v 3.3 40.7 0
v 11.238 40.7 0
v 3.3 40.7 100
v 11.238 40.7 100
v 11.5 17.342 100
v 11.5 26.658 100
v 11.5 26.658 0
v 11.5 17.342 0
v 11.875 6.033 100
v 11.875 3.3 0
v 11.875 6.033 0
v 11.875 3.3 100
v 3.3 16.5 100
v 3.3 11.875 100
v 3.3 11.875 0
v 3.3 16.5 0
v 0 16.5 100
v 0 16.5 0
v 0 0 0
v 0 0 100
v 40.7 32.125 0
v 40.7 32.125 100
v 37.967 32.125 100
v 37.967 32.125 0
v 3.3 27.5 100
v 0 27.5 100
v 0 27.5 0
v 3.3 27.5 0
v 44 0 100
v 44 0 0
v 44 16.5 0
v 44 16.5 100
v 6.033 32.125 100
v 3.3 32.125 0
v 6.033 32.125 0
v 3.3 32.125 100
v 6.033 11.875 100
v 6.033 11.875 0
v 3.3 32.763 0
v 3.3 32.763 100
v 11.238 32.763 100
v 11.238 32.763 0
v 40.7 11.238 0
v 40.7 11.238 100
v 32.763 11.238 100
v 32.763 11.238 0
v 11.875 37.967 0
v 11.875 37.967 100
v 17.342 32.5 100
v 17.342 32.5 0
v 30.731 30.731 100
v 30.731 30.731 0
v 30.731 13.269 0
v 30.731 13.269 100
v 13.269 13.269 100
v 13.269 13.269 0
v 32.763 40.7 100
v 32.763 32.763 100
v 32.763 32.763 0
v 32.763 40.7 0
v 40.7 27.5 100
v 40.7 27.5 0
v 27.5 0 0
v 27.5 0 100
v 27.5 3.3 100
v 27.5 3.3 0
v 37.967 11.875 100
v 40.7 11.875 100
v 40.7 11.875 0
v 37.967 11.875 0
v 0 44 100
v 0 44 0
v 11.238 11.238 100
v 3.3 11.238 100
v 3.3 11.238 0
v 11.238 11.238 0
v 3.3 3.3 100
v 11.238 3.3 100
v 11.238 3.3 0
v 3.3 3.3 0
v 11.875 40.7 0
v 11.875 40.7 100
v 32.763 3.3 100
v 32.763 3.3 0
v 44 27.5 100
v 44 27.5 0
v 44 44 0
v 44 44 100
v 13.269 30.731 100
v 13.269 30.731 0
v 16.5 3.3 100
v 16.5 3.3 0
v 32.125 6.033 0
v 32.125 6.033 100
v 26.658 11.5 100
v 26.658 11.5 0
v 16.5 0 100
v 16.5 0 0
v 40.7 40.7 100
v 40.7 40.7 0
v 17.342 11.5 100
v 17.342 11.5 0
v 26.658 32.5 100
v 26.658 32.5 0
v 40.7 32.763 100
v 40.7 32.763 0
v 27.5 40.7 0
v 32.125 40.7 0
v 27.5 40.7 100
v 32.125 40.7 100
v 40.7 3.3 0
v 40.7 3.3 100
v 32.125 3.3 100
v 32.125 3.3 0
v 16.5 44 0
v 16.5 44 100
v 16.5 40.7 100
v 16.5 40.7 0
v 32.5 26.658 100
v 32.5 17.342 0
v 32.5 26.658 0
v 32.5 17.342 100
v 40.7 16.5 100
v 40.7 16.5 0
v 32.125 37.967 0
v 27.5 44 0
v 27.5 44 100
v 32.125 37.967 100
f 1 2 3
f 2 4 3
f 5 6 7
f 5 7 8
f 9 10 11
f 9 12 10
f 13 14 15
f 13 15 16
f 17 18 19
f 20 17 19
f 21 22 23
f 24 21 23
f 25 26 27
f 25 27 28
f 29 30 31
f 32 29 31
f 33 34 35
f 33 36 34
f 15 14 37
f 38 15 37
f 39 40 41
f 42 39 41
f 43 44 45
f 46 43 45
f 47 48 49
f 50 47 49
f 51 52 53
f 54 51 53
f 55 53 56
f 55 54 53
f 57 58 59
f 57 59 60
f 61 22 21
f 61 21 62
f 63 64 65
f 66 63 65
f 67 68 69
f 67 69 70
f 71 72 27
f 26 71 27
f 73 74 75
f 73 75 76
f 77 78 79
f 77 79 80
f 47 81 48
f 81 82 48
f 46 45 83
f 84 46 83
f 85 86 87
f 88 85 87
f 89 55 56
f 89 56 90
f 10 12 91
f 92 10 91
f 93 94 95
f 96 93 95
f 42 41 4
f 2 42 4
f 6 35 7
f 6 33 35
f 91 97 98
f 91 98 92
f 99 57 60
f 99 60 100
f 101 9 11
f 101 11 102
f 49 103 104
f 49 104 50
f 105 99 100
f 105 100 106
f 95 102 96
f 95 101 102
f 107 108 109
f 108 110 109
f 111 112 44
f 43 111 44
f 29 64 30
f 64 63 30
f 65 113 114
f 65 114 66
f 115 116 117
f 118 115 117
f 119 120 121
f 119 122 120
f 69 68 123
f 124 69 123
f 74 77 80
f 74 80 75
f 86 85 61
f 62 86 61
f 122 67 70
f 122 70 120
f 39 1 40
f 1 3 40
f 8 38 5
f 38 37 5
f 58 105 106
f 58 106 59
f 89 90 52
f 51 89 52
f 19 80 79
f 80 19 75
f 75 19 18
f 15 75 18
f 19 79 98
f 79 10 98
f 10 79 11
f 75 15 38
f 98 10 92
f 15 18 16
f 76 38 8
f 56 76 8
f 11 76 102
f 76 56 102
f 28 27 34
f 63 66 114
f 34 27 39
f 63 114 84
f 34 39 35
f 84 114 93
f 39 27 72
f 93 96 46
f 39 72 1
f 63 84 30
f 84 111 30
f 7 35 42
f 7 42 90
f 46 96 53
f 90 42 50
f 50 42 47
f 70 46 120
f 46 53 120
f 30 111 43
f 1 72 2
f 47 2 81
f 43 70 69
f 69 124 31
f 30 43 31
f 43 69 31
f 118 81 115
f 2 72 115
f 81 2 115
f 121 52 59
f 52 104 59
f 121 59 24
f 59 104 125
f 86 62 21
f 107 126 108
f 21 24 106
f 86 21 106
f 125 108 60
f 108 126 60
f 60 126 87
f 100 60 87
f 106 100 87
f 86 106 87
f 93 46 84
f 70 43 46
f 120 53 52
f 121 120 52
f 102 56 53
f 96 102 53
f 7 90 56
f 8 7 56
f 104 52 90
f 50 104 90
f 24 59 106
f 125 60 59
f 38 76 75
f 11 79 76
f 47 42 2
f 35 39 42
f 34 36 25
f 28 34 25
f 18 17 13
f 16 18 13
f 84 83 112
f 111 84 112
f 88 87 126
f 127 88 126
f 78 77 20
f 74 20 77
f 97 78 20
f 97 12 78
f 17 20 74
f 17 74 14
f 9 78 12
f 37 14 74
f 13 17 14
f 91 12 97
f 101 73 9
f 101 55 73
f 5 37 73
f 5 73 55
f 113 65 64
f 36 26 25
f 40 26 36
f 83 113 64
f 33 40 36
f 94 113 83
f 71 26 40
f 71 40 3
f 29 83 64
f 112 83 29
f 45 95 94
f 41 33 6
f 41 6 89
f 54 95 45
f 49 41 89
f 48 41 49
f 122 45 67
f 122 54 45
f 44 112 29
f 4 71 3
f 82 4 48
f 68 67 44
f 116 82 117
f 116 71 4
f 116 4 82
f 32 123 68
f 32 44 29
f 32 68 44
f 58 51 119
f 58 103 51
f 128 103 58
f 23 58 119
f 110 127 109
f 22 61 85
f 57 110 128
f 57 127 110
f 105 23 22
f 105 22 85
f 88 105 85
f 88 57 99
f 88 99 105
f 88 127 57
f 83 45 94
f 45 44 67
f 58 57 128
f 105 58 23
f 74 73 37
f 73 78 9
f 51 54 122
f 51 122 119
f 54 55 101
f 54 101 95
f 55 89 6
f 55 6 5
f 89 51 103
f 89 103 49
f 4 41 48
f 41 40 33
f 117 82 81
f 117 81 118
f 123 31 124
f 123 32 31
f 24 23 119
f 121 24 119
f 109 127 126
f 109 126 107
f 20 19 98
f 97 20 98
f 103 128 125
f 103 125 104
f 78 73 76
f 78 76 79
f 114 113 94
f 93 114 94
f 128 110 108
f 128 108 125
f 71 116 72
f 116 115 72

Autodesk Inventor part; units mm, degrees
ref_plane "YZ Plane" through (0, 0, 0) normal (1, 0, 0) x (0, 1, 0)
ref_plane "XZ Plane" through (0, 0, 0) normal (0, 1, 0) x (-1, 0, 0)
ref_plane "XY Plane" through (0, 0, 0) normal (0, 0, 1) x (1, 0, 0)
sketch "Sketch1" plane through (0, 0, 0) normal (0, 0, 1) x (1, 0, 0)
  line L0 (0, 0) -> (44, 0)
  line L1 (44, 0) -> (44, 44)
  line L2 (44, 44) -> (0, 44)
  line L3 (0, 44) -> (0, 0)
  dimension "d5" = 44
  dimension "d6" = 44
extrude "JOKAB, 44MM" add sketch "Sketch1" along normal blind 100
sketch "Sketch2" plane through (0, 0, 100) normal (0, 0, 1) x (1, 0, 0)
  line L0 (44, 0) -> (0, 0) projected
  line L1 (0, 44) -> (44, 44) projected
  line L2 (44, 44) -> (0, 44) projected
  line L3 (16.5, 44) -> (16.5, 40.7)
  line L4 (11.875, 40.7) -> (11.875, 37.9667)
  line L5 (11.875, 37.9667) -> (17.3417, 32.5)
  line L6 (22, 44) -> (22, 0) construction
  line L7 (0, 44) -> (0, 0) projected
  line L8 (0, 22) -> (44, 22) construction
  line L9 (44, 0) -> (44, 44) projected
  line L10 (17.3417, 32.5) -> (22, 32.5)
  line L11 (11.875, 40.7) -> (16.5, 40.7)
  line L12 (27.5, 44) -> (27.5, 40.7)
  line L13 (32.125, 40.7) -> (32.125, 37.9667)
  line L14 (32.125, 37.9667) -> (26.6583, 32.5)
  line L15 (26.6583, 32.5) -> (22, 32.5)
  line L16 (32.125, 40.7) -> (27.5, 40.7)
  line L17 (16.5, 0) -> (16.5, 3.3)
  line L18 (11.875, 3.3) -> (11.875, 6.0333)
  line L19 (11.875, 6.0333) -> (17.3417, 11.5)
  line L20 (17.3417, 11.5) -> (22, 11.5)
  line L21 (11.875, 3.3) -> (16.5, 3.3)
  line L22 (27.5, 0) -> (27.5, 3.3)
  line L23 (32.125, 3.3) -> (27.5, 3.3)
  line L24 (32.125, 3.3) -> (32.125, 6.0333)
  line L25 (32.125, 6.0333) -> (26.6583, 11.5)
  line L26 (26.6583, 11.5) -> (22, 11.5)
  line L27 (0, 16.5) -> (3.3, 16.5)
  line L28 (3.3, 11.875) -> (6.0333, 11.875)
  line L29 (6.0333, 11.875) -> (11.5, 17.3417)
  line L30 (22, 0) -> (22, 44) construction
  line L31 (11.5, 17.3417) -> (11.5, 22)
  line L32 (3.3, 11.875) -> (3.3, 16.5)
  line L33 (0, 27.5) -> (3.3, 27.5)
  line L34 (3.3, 32.125) -> (3.3, 27.5)
  line L35 (3.3, 32.125) -> (6.0333, 32.125)
  line L36 (6.0333, 32.125) -> (11.5, 26.6583)
  line L37 (11.5, 26.6583) -> (11.5, 22)
  line L38 (27.5, 0) -> (27.5, 3.3)
  line L39 (32.125, 3.3) -> (32.125, 6.0333)
  line L40 (32.125, 6.0333) -> (26.6583, 11.5)
  line L41 (44, 22) -> (0, 22) construction
  line L42 (26.6583, 11.5) -> (22, 11.5)
  line L43 (32.125, 3.3) -> (27.5, 3.3)
  line L44 (16.5, 0) -> (16.5, 3.3)
  line L45 (11.875, 3.3) -> (16.5, 3.3)
  line L46 (11.875, 3.3) -> (11.875, 6.0333)
  line L47 (11.875, 6.0333) -> (17.3417, 11.5)
  line L48 (17.3417, 11.5) -> (22, 11.5)
  line L49 (44, 27.5) -> (40.7, 27.5)
  line L50 (40.7, 32.125) -> (37.9667, 32.125)
  line L51 (37.9667, 32.125) -> (32.5, 26.6583)
  line L52 (22, 44) -> (22, 0) construction
  line L53 (32.5, 26.6583) -> (32.5, 22)
  line L54 (40.7, 32.125) -> (40.7, 27.5)
  line L55 (44, 16.5) -> (40.7, 16.5)
  line L56 (40.7, 11.875) -> (40.7, 16.5)
  line L57 (40.7, 11.875) -> (37.9667, 11.875)
  line L58 (37.9667, 11.875) -> (32.5, 17.3417)
  line L59 (32.5, 17.3417) -> (32.5, 22)
  line L60 (27.5, 44) -> (16.5, 44)
  line L61 (44, 27.5) -> (44, 16.5)
  line L62 (27.5, 0) -> (16.5, 0)
  line L63 (0, 16.5) -> (0, 27.5)
  point P0 (22, 22)
  point P1 (22, 22)
  point P2 (22, 22)
  point P3 (22, 22)
  dimension "d10" = 5.5
  dimension "d11" = 10.125
  dimension "d12" = 11.5
  dimension "d13" = 45
  dimension "d15" = 2.7333
  dimension "d17" = 8.2
  dimension "d20" = 360
extrude "Extrusion2" cut sketch "Sketch2" against normal through all contours L0 L17 L21 L18 L19 L20 L26 L25 L24 L23 L22 | L55 L56 L57 L58 L59 L53 L51 L50 L54 L49 L9 | L7 L33 L34 L35 L36 L37 L31 L29 L28 L32 L27 | L12 L16 L13 L14 L15 L10 L5 L4 L11 L3 L1
sketch "Sketch3" plane through (0, 0, 100) normal (0, 0, 1) x (1, 0, 0)
  line L0 (11.5, 26.6583) -> (11.5, 17.3417) projected
  line L1 (17.3417, 11.5) -> (26.6583, 11.5) projected
  line L2 (32.5, 17.3417) -> (32.5, 26.6583) projected
  line L3 (26.6583, 32.5) -> (17.3417, 32.5) projected
  line L4 (13.2688, 13.2687) -> (13.2687, 30.7313)
  line L5 (13.2687, 30.7313) -> (30.7312, 30.7313)
  line L6 (30.7312, 30.7313) -> (30.7313, 13.2688)
  line L7 (30.7313, 13.2688) -> (13.2688, 13.2687)
  line L8 (32.5, 22) -> (11.5, 22) construction
  line L9 (22, 32.5) -> (22, 11.5) construction
  dimension "d36" = 17.4625
  dimension "d37" = 8.7312
  dimension "d38" = 17.4625
  dimension "d39" = 8.7312
extrude "Extrusion3" cut sketch "Sketch3" against normal through all
sketch "Sketch4" plane through (0, 0, 100) normal (0, 0, 1) x (1, 0, 0)
  line L0 (11.5, 26.6583) -> (11.5, 17.3417) projected
  line L1 (17.3417, 11.5) -> (26.6583, 11.5) projected
  line L2 (32.5, 17.3417) -> (32.5, 26.6583) projected
  line L3 (44, 44) -> (44, 27.5) projected
  line L4 (27.5, 44) -> (44, 44) projected
  line L5 (26.6583, 32.5) -> (17.3417, 32.5) projected
  line L6 (40.7, 32.7625) -> (32.7625, 32.7625)
  line L7 (32.7625, 32.7625) -> (32.7625, 40.7)
  line L8 (32.7625, 40.7) -> (40.7, 40.7)
  line L9 (40.7, 40.7) -> (40.7, 32.7625)
  line L10 (32.5, 22) -> (11.5, 22)
  line L11 (22, 32.5) -> (22, 11.5)
  line L12 (3.3, 32.7625) -> (11.2375, 32.7625)
  line L13 (11.2375, 32.7625) -> (11.2375, 40.7)
  line L14 (11.2375, 40.7) -> (3.3, 40.7)
  line L15 (3.3, 40.7) -> (3.3, 32.7625)
  line L16 (40.7, 11.2375) -> (32.7625, 11.2375)
  line L17 (32.7625, 11.2375) -> (32.7625, 3.3)
  line L18 (32.7625, 3.3) -> (40.7, 3.3)
  line L19 (40.7, 3.3) -> (40.7, 11.2375)
  line L20 (11.2375, 11.2375) -> (11.2375, 3.3)
  line L21 (11.2375, 3.3) -> (3.3, 3.3)
  line L22 (3.3, 3.3) -> (3.3, 11.2375)
  line L23 (3.3, 11.2375) -> (11.2375, 11.2375)
  dimension "d30" = 3.3
  dimension "d31" = 3.3
  dimension "d32" = 7.9375
  dimension "d33" = 7.9375
extrude "Extrusion4" cut sketch "Sketch4" against normal through all
equation "\"d15\" = 0.333333 * d17"
equation "\"d37\" = 0.5 * d36"
equation "\"d38\" = d36"
equation "\"d39\" = d37"
equation "\"d31\" = d30"
equation "\"d33\" = d32"
properties part number "BAR, EXTRUDED, ALUM, 44MMX44MM, JOKAB" material "Aluminum, 6061"
